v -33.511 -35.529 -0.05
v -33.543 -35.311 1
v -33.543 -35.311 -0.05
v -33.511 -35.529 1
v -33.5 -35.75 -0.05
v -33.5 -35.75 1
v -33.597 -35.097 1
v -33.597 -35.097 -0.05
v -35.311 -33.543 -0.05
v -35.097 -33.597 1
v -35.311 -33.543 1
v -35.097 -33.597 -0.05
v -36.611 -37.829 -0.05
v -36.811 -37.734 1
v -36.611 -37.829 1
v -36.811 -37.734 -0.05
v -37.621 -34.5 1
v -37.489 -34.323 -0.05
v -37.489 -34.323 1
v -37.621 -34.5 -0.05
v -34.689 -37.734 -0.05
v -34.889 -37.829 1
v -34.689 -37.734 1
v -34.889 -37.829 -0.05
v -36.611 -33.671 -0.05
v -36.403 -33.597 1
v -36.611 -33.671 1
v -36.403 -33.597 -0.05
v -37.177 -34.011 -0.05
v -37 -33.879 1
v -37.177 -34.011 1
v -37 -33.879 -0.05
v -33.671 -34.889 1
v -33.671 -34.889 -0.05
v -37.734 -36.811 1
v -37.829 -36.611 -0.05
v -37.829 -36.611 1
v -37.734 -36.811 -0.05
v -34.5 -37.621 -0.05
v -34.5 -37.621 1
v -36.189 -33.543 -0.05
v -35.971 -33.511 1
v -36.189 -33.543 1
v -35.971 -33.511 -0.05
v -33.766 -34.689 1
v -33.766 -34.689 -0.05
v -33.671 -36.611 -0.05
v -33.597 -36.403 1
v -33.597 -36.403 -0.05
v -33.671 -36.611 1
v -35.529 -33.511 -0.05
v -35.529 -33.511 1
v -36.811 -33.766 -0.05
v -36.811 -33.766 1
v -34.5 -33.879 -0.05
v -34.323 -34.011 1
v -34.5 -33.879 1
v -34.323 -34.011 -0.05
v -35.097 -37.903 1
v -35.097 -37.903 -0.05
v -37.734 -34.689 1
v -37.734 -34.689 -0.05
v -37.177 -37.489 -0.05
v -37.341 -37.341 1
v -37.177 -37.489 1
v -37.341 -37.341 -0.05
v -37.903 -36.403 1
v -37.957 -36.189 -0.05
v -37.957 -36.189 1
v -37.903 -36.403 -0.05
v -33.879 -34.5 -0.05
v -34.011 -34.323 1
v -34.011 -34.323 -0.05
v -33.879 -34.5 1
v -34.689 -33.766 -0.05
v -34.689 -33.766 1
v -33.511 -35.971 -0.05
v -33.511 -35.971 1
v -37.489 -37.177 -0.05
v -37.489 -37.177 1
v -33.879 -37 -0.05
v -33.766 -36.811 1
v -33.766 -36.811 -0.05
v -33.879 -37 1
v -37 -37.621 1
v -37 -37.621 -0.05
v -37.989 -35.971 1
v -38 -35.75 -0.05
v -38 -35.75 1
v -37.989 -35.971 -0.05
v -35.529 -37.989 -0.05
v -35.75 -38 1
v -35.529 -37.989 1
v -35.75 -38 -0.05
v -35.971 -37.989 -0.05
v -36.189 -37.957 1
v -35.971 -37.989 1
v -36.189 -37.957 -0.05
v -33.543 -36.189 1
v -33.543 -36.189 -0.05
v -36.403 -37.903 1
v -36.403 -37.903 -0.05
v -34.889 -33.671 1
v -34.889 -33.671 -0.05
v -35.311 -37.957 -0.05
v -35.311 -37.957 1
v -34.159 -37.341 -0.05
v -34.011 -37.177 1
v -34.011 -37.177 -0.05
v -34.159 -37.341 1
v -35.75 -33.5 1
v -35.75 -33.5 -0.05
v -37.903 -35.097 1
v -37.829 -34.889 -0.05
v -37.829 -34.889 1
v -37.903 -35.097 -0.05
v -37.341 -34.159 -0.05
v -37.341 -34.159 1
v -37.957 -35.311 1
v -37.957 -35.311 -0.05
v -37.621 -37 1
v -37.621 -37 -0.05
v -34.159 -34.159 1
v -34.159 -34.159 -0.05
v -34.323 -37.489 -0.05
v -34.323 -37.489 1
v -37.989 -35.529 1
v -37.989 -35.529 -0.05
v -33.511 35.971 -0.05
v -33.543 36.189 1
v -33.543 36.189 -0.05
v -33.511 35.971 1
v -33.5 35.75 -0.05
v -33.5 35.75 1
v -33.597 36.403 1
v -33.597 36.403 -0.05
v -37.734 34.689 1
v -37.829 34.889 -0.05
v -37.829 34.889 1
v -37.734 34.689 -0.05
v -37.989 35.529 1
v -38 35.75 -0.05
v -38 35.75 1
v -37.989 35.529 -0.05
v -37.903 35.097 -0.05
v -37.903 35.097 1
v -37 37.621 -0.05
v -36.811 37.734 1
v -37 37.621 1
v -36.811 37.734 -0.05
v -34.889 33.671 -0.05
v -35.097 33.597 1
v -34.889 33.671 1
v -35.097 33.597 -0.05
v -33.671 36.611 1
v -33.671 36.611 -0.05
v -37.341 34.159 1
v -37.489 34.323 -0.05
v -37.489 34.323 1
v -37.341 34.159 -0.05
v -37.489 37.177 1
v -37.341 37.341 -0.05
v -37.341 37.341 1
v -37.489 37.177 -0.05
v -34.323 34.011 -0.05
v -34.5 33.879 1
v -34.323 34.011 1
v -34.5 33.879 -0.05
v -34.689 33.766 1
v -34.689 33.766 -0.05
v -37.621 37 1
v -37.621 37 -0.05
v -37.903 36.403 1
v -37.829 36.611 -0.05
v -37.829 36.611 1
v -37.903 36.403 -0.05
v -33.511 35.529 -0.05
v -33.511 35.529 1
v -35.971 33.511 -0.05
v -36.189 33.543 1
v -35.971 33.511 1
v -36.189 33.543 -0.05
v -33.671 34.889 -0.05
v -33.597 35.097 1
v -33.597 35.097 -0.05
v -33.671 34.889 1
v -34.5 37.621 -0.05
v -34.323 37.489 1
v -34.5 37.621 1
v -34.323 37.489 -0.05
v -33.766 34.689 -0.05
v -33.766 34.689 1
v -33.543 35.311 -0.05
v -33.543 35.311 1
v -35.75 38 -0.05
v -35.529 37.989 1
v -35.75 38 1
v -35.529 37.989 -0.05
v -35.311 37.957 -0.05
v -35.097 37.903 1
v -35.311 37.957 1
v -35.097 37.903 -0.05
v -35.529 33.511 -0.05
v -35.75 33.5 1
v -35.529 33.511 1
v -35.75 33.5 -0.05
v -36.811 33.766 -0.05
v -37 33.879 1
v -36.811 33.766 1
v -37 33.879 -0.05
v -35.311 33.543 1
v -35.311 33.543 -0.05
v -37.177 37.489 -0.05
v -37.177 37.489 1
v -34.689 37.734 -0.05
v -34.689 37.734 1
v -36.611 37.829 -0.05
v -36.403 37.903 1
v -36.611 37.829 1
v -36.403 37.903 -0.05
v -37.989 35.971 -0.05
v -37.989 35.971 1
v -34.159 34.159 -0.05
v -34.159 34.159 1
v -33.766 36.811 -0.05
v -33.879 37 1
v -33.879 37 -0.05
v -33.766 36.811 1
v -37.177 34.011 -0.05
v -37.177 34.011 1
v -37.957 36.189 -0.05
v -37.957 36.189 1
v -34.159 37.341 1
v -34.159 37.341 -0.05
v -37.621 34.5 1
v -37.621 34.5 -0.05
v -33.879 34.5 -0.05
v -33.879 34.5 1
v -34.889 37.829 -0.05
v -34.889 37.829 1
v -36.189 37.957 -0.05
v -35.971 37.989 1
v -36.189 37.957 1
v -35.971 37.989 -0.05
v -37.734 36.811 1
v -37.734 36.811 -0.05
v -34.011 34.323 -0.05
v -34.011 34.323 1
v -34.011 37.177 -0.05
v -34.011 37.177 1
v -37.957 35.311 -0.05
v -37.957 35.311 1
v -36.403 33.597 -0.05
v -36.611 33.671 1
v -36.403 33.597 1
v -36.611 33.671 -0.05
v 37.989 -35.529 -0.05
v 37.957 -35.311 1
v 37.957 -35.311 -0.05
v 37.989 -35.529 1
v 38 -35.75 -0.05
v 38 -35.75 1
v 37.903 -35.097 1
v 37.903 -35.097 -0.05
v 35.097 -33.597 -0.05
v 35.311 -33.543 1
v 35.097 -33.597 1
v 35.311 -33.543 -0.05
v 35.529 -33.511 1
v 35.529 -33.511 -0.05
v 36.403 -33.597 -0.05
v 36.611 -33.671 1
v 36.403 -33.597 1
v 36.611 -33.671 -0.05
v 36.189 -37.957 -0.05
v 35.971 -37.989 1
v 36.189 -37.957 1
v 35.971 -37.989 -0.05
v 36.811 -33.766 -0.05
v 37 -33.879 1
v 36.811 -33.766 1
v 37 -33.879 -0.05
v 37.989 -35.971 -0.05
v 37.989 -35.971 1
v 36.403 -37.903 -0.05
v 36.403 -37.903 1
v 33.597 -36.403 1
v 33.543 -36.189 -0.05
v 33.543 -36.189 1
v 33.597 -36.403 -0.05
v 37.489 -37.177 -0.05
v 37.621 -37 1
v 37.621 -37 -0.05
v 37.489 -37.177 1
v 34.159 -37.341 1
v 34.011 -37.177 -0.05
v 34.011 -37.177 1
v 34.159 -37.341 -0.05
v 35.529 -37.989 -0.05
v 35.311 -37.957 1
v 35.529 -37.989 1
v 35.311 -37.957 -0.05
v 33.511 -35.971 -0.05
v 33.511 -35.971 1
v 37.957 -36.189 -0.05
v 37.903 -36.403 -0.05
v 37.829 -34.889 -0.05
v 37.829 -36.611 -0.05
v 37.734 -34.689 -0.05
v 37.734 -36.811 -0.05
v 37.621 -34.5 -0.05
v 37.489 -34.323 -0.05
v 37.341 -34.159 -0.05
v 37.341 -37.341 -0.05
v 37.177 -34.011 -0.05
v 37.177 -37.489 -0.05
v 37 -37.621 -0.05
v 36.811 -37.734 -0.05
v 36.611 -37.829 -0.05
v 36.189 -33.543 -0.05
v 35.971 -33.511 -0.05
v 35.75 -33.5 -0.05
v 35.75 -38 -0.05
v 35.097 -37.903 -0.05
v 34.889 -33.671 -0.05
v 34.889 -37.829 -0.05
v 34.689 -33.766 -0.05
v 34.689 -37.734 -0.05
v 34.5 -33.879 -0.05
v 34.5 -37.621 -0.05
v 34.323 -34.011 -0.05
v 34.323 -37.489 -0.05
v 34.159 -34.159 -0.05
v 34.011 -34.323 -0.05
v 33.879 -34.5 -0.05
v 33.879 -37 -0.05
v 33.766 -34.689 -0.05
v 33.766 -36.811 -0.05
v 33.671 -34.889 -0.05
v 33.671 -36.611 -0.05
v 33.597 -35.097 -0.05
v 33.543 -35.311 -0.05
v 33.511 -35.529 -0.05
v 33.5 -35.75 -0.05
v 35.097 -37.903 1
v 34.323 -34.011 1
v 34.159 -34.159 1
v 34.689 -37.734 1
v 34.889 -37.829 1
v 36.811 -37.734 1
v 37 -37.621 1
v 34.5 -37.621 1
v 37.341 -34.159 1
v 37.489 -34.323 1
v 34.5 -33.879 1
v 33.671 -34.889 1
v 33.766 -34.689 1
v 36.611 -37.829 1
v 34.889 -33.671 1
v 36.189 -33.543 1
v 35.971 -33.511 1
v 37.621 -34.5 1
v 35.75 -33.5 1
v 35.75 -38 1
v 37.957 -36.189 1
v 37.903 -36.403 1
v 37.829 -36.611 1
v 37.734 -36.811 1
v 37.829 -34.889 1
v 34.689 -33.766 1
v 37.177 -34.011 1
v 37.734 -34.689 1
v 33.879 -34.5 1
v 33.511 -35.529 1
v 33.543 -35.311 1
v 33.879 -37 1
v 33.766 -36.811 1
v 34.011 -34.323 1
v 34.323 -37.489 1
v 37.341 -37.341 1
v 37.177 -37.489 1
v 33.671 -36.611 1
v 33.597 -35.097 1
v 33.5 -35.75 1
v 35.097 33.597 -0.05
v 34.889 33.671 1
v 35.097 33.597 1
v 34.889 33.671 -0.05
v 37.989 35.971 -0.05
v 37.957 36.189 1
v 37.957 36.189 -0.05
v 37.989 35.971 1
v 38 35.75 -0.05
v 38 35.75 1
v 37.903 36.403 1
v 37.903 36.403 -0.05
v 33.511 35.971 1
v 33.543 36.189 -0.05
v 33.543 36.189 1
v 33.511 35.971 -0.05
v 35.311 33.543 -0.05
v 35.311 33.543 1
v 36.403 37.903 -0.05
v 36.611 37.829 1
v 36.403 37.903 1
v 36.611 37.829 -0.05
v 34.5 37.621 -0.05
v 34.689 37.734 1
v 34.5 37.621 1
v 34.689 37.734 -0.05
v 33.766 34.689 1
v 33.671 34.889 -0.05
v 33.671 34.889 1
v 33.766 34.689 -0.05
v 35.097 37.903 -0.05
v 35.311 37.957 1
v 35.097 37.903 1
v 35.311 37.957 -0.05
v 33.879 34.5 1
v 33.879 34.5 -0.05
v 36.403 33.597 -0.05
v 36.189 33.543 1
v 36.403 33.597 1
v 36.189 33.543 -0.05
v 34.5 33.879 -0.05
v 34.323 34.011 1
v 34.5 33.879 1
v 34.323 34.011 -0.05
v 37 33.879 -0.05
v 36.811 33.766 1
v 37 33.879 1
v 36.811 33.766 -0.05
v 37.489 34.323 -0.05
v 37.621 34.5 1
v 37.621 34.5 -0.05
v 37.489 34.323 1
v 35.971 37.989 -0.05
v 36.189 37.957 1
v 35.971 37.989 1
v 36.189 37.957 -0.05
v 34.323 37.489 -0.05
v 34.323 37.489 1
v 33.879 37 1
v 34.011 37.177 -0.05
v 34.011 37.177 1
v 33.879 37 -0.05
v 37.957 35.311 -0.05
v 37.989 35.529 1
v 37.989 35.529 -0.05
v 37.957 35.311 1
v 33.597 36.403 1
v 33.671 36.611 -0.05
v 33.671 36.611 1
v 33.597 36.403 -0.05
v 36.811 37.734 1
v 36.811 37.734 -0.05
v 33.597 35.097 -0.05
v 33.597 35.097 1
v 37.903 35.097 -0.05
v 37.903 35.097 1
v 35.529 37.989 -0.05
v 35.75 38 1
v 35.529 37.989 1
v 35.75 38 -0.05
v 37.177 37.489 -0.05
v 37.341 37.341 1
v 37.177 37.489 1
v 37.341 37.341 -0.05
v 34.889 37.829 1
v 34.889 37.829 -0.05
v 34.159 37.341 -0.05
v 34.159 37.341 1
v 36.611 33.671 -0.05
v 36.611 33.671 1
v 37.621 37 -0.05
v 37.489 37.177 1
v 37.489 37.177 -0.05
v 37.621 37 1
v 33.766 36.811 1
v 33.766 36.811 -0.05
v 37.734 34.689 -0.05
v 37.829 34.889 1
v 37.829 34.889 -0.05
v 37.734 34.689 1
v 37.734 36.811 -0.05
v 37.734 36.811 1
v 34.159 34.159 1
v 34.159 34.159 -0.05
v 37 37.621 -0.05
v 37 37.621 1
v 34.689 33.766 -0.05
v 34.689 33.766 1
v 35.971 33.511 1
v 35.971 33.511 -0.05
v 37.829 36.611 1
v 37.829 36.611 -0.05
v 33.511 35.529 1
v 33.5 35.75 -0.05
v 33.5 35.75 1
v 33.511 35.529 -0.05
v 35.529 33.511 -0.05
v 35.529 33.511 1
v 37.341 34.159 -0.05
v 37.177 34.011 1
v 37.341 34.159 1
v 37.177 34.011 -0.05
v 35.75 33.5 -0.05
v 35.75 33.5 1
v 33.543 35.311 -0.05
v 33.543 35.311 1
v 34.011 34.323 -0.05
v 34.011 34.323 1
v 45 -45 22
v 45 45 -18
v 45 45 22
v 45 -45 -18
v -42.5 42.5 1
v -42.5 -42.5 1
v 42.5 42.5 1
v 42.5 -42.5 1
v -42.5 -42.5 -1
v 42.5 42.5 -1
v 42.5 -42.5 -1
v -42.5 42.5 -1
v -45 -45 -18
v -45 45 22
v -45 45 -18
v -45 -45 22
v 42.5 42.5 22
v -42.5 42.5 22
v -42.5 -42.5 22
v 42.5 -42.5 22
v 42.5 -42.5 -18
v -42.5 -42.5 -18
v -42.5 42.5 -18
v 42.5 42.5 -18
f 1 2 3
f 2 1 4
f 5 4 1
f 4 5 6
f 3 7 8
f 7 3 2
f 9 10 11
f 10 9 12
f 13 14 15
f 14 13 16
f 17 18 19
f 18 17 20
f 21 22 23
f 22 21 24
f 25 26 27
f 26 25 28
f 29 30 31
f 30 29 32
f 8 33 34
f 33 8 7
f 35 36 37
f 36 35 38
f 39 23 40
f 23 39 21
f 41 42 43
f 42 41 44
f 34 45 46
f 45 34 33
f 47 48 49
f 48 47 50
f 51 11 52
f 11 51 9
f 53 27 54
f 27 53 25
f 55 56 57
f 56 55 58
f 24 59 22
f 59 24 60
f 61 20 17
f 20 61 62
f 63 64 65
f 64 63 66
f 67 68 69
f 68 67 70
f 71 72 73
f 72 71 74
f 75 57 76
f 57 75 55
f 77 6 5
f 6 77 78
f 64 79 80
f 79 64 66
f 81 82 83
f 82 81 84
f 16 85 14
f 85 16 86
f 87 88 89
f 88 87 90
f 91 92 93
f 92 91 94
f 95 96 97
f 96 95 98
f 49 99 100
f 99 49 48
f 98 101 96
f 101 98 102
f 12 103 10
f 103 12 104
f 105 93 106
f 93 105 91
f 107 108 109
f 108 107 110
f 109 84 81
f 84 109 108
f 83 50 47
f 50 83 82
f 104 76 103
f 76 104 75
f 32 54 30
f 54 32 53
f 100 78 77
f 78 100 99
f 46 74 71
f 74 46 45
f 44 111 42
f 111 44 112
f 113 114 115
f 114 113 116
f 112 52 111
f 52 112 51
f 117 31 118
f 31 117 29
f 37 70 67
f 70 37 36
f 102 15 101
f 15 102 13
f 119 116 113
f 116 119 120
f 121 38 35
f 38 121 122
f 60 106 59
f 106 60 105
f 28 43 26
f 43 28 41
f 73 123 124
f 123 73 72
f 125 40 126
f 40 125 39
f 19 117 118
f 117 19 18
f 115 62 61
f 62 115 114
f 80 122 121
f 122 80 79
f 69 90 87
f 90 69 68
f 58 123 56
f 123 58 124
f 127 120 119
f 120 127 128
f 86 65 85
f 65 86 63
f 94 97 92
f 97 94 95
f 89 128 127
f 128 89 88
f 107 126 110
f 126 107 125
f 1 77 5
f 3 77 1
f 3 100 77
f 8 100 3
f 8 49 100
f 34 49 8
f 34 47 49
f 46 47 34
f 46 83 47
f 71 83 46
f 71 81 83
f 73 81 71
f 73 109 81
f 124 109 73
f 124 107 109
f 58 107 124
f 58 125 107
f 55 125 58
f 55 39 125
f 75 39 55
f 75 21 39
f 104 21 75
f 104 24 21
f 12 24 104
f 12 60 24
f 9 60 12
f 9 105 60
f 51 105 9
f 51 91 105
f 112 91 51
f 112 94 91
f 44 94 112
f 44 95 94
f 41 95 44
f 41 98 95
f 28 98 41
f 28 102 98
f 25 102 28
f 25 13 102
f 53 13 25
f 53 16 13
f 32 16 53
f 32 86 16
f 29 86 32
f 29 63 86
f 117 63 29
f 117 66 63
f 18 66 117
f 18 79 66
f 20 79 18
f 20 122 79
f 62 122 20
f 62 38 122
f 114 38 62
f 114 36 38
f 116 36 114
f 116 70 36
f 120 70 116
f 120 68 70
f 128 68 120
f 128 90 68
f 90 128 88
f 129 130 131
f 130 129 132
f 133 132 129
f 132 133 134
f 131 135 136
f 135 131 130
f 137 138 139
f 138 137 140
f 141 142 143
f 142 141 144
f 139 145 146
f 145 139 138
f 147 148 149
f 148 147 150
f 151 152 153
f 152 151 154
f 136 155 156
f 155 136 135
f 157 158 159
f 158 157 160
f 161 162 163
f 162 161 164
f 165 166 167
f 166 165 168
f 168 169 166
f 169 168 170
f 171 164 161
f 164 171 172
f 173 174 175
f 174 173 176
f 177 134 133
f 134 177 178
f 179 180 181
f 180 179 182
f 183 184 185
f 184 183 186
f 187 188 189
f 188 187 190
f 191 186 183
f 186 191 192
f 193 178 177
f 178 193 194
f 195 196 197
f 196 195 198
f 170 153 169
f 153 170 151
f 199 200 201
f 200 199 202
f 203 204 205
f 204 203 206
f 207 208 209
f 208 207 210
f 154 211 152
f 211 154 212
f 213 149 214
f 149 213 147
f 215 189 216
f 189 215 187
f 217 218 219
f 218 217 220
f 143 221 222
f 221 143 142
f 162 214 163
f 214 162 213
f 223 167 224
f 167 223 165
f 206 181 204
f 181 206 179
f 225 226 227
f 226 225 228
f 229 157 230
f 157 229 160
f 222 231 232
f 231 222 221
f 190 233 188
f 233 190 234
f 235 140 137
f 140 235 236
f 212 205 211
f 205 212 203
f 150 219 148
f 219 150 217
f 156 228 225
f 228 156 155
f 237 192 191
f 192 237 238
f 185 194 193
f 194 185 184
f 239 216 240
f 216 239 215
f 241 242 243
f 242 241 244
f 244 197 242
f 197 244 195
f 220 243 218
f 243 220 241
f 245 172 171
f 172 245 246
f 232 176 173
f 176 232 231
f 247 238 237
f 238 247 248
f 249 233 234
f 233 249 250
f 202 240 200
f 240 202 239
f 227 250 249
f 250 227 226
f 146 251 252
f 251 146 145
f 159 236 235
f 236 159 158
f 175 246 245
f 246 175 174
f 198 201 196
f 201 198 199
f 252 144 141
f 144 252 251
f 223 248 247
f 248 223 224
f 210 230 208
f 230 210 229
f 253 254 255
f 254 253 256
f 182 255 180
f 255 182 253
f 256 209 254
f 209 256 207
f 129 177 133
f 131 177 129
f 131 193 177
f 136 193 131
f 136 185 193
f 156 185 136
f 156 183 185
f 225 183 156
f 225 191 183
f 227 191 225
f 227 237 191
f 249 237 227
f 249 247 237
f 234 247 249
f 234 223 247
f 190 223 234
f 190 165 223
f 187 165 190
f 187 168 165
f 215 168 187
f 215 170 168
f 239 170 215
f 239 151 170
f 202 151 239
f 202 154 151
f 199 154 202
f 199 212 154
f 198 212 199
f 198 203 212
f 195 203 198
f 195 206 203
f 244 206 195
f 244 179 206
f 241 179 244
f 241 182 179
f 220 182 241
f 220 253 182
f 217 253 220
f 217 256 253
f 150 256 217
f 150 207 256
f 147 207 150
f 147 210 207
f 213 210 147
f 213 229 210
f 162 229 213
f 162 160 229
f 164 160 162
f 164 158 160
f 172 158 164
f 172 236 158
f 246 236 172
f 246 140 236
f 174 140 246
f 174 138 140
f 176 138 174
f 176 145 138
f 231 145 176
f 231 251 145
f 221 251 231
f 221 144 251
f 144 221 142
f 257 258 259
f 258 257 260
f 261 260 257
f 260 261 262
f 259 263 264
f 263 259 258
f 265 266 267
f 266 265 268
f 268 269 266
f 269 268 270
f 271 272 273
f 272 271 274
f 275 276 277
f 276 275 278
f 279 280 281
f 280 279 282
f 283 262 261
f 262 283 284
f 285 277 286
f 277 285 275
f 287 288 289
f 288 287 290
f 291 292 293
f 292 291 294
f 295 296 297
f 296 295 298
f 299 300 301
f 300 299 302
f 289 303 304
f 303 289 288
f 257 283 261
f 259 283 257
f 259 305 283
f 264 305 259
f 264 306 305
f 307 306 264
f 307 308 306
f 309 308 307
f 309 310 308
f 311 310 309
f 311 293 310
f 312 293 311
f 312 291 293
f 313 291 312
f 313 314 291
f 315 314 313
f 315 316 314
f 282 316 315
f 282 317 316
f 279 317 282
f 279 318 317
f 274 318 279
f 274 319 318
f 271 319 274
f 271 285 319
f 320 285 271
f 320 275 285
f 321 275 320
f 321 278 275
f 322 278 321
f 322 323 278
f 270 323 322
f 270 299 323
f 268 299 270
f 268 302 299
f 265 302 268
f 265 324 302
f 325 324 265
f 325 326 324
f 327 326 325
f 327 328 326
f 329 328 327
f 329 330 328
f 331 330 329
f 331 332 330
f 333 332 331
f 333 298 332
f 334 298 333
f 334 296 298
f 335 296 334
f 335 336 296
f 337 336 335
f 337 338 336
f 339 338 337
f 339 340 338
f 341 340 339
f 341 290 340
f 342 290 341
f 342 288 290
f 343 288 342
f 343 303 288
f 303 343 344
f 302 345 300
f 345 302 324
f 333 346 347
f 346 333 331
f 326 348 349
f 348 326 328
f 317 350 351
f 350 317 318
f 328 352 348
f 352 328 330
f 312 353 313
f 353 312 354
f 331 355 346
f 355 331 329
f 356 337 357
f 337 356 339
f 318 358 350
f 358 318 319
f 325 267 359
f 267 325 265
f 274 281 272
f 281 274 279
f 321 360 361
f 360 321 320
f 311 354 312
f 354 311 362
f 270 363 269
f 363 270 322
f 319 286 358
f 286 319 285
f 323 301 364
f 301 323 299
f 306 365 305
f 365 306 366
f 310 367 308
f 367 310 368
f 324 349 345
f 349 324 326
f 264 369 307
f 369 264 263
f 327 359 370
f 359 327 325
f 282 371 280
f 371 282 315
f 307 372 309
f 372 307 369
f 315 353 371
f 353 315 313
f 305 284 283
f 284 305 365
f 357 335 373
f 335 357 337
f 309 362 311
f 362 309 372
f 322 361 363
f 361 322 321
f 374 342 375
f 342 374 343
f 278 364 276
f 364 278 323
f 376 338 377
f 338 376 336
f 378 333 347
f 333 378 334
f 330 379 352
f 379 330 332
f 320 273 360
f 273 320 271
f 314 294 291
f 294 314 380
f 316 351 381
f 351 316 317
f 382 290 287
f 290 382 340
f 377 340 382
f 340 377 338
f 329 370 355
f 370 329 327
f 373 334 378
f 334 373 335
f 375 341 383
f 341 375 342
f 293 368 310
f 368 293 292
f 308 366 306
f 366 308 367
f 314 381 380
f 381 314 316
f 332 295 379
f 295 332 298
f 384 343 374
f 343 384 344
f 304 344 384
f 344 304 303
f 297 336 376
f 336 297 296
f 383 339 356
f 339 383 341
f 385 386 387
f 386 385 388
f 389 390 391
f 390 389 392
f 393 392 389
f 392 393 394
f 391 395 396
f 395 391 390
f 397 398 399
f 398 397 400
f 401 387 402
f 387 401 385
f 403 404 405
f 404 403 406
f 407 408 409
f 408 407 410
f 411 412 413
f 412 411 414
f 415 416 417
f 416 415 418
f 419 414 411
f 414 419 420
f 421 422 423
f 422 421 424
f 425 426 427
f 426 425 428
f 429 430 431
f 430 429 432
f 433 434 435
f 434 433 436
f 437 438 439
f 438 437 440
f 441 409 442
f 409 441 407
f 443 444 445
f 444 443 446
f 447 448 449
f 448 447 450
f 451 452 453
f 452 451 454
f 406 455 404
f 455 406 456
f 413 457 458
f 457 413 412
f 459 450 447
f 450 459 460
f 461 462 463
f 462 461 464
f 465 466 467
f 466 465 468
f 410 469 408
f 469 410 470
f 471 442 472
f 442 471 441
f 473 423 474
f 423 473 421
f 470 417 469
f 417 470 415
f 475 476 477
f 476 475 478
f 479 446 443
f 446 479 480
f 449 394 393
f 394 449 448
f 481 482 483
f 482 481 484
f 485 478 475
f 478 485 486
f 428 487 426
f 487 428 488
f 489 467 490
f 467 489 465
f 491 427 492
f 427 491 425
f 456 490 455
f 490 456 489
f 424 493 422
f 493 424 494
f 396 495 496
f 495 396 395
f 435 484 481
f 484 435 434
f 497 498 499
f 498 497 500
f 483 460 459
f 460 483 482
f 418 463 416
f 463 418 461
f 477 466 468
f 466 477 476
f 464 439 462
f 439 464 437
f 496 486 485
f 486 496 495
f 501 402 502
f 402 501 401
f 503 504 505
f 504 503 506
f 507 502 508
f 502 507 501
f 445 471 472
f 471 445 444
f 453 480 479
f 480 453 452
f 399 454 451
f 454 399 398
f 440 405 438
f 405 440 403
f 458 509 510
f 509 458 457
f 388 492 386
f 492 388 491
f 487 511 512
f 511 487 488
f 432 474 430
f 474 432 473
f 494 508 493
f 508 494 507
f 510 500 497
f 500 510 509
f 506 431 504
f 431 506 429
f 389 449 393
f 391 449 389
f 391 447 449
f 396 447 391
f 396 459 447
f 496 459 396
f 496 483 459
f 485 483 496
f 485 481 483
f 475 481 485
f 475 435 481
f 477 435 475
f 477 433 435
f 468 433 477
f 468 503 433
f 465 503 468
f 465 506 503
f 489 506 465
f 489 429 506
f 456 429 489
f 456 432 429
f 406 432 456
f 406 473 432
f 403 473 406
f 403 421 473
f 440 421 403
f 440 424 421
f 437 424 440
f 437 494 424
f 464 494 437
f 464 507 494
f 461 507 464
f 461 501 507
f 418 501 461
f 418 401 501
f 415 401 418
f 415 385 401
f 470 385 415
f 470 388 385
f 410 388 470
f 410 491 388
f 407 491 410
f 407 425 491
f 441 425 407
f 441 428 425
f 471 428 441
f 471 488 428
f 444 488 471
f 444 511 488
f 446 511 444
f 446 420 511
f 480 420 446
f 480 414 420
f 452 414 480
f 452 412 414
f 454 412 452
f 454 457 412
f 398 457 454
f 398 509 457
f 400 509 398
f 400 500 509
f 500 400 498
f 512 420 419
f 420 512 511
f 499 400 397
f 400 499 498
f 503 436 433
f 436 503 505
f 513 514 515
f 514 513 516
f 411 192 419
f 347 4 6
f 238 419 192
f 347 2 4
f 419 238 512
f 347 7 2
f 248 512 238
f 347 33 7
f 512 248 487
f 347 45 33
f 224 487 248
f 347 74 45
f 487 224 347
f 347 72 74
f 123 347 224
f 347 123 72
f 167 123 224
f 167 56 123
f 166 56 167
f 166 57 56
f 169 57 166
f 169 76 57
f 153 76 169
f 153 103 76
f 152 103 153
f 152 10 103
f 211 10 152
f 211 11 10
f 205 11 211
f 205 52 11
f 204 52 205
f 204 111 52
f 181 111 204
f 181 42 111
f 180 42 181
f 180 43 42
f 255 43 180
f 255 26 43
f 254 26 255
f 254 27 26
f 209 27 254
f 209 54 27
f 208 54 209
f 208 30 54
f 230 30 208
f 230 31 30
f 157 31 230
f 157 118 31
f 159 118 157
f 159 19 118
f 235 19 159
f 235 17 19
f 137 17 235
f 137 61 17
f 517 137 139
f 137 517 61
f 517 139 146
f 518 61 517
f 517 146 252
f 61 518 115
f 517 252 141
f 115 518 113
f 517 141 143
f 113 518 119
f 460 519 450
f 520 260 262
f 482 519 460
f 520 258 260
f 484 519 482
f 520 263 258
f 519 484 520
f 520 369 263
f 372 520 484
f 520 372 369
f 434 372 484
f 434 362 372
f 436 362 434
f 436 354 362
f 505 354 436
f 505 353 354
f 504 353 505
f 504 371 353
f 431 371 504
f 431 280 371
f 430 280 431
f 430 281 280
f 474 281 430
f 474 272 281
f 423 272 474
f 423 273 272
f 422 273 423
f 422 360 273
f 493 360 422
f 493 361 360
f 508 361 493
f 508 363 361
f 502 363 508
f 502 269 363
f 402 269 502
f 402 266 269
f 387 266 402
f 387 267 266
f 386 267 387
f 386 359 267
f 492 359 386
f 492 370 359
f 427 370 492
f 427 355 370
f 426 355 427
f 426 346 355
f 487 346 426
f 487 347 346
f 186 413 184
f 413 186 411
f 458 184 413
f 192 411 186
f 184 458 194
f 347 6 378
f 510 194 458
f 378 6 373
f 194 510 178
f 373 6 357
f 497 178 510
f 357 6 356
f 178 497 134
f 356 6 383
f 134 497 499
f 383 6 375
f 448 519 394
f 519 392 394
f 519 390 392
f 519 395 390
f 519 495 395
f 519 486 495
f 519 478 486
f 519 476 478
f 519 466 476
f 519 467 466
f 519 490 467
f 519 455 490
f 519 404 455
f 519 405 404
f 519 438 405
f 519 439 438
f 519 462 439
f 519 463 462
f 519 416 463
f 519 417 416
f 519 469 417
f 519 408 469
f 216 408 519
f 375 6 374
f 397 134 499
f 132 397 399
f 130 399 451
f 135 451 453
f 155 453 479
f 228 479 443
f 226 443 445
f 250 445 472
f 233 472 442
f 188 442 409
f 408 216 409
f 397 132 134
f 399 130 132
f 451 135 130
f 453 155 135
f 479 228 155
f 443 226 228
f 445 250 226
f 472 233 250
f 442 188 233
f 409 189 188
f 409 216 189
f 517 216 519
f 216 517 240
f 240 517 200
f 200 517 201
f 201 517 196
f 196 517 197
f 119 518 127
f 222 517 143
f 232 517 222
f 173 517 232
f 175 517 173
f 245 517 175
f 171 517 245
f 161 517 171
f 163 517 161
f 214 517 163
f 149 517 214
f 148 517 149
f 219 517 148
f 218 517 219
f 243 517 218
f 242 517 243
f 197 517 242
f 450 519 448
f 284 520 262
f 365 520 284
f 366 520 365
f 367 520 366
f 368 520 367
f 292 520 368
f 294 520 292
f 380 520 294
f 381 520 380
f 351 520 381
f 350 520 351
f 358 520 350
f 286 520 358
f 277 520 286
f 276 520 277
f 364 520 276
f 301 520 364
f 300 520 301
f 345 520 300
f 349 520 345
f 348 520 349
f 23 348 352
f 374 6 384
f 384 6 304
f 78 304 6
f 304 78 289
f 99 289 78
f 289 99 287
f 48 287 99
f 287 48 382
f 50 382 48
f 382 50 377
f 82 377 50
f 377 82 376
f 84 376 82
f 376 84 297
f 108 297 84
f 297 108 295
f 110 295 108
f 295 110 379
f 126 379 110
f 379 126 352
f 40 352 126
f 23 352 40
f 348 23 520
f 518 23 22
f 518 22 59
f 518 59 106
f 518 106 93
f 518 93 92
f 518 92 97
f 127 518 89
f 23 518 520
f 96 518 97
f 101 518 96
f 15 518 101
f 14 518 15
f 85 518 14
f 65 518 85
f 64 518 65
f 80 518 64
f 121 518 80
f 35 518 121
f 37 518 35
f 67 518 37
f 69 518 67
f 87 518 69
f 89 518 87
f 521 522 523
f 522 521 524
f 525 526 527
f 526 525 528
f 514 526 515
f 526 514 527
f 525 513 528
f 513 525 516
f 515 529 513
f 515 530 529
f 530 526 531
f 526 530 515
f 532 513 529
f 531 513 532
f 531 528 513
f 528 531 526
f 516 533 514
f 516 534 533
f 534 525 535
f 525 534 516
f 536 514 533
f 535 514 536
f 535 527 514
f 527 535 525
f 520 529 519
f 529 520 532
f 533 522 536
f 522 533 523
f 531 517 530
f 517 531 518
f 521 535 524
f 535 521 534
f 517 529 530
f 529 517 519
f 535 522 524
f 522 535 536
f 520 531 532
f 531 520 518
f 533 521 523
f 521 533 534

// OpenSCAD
// Dimensions for DIY Magnetic Stirrer Housing
// Units: mm

// Overall Geometry
outer_size = 90;       // Outer dimensions (X and Y)
wall_thickness = 2.5;  // Thickness of the four walls
top_plate_thickness = 2; // Thickness of the top plate (stirring surface)

// Fan Mounting
fan_mount_hole_dia = 4.5; // Diameter of M4 screw holes
fan_mount_spacing = 71.5; // Distance between mounting holes (square pattern)

// Cable Notch
notch_width = 12;      // Width of the notch
notch_depth = 8;       // Depth of the notch (down from top)
notch_z_start = 32;    // Z coordinate where notch starts (bottom of notch)
notch_z_end = 40;      // Z coordinate where notch ends (top of notch)

// Derived Dimensions
inner_size = outer_size - (2 * wall_thickness); // Inner box dimensions
mount_hole_offset = fan_mount_spacing / 2;      // Offset from center to mounting holes
notch_center_x = outer_size / 2;                // X position of notch center

// Rendering
$fn = 64; // High resolution for curved surfaces

// Main Housing Assembly
module stirrer_housing() {
    union() {
        // 1. Top Plate (Stirring Surface)
        // Positioned at z=0 to z=2
        translate([0, 0, 0])
        difference() {
            // Base plate
            cube([outer_size, outer_size, top_plate_thickness], center=true);
            
            // Cut mounting holes
            for (x = [-mount_hole_offset, mount_hole_offset]) {
                for (y = [-mount_hole_offset, mount_hole_offset]) {
                    translate([x, y, top_plate_thickness / 2])
                    cylinder(d = fan_mount_hole_dia, h = top_plate_thickness + 0.1, center=true);
                }
            }
        }

        // 2. Walls
        // Positioned at z=2 to z=40
        translate([0, 0, top_plate_thickness])
        difference() {
            // Base box walls
            cube([outer_size, outer_size, 40], center=true);
            
            // Cut out the inner cavity
            translate([0, 0, -0.1])
            cube([inner_size, inner_size, 40.2], center=true);
            
            // Cut out the cable notch
            // The notch is centered along the wall. 
            // Assuming the notch is on the +X wall (right side) for this example.
            // The wall is at x = outer_size/2.
            translate([notch_center_x, 0, notch_z_start - top_plate_thickness])
            cube([notch_width, outer_size, notch_z_end - notch_z_start + 0.1], center=true);
        }
    }
}

// Render the part
stirrer_housing();
